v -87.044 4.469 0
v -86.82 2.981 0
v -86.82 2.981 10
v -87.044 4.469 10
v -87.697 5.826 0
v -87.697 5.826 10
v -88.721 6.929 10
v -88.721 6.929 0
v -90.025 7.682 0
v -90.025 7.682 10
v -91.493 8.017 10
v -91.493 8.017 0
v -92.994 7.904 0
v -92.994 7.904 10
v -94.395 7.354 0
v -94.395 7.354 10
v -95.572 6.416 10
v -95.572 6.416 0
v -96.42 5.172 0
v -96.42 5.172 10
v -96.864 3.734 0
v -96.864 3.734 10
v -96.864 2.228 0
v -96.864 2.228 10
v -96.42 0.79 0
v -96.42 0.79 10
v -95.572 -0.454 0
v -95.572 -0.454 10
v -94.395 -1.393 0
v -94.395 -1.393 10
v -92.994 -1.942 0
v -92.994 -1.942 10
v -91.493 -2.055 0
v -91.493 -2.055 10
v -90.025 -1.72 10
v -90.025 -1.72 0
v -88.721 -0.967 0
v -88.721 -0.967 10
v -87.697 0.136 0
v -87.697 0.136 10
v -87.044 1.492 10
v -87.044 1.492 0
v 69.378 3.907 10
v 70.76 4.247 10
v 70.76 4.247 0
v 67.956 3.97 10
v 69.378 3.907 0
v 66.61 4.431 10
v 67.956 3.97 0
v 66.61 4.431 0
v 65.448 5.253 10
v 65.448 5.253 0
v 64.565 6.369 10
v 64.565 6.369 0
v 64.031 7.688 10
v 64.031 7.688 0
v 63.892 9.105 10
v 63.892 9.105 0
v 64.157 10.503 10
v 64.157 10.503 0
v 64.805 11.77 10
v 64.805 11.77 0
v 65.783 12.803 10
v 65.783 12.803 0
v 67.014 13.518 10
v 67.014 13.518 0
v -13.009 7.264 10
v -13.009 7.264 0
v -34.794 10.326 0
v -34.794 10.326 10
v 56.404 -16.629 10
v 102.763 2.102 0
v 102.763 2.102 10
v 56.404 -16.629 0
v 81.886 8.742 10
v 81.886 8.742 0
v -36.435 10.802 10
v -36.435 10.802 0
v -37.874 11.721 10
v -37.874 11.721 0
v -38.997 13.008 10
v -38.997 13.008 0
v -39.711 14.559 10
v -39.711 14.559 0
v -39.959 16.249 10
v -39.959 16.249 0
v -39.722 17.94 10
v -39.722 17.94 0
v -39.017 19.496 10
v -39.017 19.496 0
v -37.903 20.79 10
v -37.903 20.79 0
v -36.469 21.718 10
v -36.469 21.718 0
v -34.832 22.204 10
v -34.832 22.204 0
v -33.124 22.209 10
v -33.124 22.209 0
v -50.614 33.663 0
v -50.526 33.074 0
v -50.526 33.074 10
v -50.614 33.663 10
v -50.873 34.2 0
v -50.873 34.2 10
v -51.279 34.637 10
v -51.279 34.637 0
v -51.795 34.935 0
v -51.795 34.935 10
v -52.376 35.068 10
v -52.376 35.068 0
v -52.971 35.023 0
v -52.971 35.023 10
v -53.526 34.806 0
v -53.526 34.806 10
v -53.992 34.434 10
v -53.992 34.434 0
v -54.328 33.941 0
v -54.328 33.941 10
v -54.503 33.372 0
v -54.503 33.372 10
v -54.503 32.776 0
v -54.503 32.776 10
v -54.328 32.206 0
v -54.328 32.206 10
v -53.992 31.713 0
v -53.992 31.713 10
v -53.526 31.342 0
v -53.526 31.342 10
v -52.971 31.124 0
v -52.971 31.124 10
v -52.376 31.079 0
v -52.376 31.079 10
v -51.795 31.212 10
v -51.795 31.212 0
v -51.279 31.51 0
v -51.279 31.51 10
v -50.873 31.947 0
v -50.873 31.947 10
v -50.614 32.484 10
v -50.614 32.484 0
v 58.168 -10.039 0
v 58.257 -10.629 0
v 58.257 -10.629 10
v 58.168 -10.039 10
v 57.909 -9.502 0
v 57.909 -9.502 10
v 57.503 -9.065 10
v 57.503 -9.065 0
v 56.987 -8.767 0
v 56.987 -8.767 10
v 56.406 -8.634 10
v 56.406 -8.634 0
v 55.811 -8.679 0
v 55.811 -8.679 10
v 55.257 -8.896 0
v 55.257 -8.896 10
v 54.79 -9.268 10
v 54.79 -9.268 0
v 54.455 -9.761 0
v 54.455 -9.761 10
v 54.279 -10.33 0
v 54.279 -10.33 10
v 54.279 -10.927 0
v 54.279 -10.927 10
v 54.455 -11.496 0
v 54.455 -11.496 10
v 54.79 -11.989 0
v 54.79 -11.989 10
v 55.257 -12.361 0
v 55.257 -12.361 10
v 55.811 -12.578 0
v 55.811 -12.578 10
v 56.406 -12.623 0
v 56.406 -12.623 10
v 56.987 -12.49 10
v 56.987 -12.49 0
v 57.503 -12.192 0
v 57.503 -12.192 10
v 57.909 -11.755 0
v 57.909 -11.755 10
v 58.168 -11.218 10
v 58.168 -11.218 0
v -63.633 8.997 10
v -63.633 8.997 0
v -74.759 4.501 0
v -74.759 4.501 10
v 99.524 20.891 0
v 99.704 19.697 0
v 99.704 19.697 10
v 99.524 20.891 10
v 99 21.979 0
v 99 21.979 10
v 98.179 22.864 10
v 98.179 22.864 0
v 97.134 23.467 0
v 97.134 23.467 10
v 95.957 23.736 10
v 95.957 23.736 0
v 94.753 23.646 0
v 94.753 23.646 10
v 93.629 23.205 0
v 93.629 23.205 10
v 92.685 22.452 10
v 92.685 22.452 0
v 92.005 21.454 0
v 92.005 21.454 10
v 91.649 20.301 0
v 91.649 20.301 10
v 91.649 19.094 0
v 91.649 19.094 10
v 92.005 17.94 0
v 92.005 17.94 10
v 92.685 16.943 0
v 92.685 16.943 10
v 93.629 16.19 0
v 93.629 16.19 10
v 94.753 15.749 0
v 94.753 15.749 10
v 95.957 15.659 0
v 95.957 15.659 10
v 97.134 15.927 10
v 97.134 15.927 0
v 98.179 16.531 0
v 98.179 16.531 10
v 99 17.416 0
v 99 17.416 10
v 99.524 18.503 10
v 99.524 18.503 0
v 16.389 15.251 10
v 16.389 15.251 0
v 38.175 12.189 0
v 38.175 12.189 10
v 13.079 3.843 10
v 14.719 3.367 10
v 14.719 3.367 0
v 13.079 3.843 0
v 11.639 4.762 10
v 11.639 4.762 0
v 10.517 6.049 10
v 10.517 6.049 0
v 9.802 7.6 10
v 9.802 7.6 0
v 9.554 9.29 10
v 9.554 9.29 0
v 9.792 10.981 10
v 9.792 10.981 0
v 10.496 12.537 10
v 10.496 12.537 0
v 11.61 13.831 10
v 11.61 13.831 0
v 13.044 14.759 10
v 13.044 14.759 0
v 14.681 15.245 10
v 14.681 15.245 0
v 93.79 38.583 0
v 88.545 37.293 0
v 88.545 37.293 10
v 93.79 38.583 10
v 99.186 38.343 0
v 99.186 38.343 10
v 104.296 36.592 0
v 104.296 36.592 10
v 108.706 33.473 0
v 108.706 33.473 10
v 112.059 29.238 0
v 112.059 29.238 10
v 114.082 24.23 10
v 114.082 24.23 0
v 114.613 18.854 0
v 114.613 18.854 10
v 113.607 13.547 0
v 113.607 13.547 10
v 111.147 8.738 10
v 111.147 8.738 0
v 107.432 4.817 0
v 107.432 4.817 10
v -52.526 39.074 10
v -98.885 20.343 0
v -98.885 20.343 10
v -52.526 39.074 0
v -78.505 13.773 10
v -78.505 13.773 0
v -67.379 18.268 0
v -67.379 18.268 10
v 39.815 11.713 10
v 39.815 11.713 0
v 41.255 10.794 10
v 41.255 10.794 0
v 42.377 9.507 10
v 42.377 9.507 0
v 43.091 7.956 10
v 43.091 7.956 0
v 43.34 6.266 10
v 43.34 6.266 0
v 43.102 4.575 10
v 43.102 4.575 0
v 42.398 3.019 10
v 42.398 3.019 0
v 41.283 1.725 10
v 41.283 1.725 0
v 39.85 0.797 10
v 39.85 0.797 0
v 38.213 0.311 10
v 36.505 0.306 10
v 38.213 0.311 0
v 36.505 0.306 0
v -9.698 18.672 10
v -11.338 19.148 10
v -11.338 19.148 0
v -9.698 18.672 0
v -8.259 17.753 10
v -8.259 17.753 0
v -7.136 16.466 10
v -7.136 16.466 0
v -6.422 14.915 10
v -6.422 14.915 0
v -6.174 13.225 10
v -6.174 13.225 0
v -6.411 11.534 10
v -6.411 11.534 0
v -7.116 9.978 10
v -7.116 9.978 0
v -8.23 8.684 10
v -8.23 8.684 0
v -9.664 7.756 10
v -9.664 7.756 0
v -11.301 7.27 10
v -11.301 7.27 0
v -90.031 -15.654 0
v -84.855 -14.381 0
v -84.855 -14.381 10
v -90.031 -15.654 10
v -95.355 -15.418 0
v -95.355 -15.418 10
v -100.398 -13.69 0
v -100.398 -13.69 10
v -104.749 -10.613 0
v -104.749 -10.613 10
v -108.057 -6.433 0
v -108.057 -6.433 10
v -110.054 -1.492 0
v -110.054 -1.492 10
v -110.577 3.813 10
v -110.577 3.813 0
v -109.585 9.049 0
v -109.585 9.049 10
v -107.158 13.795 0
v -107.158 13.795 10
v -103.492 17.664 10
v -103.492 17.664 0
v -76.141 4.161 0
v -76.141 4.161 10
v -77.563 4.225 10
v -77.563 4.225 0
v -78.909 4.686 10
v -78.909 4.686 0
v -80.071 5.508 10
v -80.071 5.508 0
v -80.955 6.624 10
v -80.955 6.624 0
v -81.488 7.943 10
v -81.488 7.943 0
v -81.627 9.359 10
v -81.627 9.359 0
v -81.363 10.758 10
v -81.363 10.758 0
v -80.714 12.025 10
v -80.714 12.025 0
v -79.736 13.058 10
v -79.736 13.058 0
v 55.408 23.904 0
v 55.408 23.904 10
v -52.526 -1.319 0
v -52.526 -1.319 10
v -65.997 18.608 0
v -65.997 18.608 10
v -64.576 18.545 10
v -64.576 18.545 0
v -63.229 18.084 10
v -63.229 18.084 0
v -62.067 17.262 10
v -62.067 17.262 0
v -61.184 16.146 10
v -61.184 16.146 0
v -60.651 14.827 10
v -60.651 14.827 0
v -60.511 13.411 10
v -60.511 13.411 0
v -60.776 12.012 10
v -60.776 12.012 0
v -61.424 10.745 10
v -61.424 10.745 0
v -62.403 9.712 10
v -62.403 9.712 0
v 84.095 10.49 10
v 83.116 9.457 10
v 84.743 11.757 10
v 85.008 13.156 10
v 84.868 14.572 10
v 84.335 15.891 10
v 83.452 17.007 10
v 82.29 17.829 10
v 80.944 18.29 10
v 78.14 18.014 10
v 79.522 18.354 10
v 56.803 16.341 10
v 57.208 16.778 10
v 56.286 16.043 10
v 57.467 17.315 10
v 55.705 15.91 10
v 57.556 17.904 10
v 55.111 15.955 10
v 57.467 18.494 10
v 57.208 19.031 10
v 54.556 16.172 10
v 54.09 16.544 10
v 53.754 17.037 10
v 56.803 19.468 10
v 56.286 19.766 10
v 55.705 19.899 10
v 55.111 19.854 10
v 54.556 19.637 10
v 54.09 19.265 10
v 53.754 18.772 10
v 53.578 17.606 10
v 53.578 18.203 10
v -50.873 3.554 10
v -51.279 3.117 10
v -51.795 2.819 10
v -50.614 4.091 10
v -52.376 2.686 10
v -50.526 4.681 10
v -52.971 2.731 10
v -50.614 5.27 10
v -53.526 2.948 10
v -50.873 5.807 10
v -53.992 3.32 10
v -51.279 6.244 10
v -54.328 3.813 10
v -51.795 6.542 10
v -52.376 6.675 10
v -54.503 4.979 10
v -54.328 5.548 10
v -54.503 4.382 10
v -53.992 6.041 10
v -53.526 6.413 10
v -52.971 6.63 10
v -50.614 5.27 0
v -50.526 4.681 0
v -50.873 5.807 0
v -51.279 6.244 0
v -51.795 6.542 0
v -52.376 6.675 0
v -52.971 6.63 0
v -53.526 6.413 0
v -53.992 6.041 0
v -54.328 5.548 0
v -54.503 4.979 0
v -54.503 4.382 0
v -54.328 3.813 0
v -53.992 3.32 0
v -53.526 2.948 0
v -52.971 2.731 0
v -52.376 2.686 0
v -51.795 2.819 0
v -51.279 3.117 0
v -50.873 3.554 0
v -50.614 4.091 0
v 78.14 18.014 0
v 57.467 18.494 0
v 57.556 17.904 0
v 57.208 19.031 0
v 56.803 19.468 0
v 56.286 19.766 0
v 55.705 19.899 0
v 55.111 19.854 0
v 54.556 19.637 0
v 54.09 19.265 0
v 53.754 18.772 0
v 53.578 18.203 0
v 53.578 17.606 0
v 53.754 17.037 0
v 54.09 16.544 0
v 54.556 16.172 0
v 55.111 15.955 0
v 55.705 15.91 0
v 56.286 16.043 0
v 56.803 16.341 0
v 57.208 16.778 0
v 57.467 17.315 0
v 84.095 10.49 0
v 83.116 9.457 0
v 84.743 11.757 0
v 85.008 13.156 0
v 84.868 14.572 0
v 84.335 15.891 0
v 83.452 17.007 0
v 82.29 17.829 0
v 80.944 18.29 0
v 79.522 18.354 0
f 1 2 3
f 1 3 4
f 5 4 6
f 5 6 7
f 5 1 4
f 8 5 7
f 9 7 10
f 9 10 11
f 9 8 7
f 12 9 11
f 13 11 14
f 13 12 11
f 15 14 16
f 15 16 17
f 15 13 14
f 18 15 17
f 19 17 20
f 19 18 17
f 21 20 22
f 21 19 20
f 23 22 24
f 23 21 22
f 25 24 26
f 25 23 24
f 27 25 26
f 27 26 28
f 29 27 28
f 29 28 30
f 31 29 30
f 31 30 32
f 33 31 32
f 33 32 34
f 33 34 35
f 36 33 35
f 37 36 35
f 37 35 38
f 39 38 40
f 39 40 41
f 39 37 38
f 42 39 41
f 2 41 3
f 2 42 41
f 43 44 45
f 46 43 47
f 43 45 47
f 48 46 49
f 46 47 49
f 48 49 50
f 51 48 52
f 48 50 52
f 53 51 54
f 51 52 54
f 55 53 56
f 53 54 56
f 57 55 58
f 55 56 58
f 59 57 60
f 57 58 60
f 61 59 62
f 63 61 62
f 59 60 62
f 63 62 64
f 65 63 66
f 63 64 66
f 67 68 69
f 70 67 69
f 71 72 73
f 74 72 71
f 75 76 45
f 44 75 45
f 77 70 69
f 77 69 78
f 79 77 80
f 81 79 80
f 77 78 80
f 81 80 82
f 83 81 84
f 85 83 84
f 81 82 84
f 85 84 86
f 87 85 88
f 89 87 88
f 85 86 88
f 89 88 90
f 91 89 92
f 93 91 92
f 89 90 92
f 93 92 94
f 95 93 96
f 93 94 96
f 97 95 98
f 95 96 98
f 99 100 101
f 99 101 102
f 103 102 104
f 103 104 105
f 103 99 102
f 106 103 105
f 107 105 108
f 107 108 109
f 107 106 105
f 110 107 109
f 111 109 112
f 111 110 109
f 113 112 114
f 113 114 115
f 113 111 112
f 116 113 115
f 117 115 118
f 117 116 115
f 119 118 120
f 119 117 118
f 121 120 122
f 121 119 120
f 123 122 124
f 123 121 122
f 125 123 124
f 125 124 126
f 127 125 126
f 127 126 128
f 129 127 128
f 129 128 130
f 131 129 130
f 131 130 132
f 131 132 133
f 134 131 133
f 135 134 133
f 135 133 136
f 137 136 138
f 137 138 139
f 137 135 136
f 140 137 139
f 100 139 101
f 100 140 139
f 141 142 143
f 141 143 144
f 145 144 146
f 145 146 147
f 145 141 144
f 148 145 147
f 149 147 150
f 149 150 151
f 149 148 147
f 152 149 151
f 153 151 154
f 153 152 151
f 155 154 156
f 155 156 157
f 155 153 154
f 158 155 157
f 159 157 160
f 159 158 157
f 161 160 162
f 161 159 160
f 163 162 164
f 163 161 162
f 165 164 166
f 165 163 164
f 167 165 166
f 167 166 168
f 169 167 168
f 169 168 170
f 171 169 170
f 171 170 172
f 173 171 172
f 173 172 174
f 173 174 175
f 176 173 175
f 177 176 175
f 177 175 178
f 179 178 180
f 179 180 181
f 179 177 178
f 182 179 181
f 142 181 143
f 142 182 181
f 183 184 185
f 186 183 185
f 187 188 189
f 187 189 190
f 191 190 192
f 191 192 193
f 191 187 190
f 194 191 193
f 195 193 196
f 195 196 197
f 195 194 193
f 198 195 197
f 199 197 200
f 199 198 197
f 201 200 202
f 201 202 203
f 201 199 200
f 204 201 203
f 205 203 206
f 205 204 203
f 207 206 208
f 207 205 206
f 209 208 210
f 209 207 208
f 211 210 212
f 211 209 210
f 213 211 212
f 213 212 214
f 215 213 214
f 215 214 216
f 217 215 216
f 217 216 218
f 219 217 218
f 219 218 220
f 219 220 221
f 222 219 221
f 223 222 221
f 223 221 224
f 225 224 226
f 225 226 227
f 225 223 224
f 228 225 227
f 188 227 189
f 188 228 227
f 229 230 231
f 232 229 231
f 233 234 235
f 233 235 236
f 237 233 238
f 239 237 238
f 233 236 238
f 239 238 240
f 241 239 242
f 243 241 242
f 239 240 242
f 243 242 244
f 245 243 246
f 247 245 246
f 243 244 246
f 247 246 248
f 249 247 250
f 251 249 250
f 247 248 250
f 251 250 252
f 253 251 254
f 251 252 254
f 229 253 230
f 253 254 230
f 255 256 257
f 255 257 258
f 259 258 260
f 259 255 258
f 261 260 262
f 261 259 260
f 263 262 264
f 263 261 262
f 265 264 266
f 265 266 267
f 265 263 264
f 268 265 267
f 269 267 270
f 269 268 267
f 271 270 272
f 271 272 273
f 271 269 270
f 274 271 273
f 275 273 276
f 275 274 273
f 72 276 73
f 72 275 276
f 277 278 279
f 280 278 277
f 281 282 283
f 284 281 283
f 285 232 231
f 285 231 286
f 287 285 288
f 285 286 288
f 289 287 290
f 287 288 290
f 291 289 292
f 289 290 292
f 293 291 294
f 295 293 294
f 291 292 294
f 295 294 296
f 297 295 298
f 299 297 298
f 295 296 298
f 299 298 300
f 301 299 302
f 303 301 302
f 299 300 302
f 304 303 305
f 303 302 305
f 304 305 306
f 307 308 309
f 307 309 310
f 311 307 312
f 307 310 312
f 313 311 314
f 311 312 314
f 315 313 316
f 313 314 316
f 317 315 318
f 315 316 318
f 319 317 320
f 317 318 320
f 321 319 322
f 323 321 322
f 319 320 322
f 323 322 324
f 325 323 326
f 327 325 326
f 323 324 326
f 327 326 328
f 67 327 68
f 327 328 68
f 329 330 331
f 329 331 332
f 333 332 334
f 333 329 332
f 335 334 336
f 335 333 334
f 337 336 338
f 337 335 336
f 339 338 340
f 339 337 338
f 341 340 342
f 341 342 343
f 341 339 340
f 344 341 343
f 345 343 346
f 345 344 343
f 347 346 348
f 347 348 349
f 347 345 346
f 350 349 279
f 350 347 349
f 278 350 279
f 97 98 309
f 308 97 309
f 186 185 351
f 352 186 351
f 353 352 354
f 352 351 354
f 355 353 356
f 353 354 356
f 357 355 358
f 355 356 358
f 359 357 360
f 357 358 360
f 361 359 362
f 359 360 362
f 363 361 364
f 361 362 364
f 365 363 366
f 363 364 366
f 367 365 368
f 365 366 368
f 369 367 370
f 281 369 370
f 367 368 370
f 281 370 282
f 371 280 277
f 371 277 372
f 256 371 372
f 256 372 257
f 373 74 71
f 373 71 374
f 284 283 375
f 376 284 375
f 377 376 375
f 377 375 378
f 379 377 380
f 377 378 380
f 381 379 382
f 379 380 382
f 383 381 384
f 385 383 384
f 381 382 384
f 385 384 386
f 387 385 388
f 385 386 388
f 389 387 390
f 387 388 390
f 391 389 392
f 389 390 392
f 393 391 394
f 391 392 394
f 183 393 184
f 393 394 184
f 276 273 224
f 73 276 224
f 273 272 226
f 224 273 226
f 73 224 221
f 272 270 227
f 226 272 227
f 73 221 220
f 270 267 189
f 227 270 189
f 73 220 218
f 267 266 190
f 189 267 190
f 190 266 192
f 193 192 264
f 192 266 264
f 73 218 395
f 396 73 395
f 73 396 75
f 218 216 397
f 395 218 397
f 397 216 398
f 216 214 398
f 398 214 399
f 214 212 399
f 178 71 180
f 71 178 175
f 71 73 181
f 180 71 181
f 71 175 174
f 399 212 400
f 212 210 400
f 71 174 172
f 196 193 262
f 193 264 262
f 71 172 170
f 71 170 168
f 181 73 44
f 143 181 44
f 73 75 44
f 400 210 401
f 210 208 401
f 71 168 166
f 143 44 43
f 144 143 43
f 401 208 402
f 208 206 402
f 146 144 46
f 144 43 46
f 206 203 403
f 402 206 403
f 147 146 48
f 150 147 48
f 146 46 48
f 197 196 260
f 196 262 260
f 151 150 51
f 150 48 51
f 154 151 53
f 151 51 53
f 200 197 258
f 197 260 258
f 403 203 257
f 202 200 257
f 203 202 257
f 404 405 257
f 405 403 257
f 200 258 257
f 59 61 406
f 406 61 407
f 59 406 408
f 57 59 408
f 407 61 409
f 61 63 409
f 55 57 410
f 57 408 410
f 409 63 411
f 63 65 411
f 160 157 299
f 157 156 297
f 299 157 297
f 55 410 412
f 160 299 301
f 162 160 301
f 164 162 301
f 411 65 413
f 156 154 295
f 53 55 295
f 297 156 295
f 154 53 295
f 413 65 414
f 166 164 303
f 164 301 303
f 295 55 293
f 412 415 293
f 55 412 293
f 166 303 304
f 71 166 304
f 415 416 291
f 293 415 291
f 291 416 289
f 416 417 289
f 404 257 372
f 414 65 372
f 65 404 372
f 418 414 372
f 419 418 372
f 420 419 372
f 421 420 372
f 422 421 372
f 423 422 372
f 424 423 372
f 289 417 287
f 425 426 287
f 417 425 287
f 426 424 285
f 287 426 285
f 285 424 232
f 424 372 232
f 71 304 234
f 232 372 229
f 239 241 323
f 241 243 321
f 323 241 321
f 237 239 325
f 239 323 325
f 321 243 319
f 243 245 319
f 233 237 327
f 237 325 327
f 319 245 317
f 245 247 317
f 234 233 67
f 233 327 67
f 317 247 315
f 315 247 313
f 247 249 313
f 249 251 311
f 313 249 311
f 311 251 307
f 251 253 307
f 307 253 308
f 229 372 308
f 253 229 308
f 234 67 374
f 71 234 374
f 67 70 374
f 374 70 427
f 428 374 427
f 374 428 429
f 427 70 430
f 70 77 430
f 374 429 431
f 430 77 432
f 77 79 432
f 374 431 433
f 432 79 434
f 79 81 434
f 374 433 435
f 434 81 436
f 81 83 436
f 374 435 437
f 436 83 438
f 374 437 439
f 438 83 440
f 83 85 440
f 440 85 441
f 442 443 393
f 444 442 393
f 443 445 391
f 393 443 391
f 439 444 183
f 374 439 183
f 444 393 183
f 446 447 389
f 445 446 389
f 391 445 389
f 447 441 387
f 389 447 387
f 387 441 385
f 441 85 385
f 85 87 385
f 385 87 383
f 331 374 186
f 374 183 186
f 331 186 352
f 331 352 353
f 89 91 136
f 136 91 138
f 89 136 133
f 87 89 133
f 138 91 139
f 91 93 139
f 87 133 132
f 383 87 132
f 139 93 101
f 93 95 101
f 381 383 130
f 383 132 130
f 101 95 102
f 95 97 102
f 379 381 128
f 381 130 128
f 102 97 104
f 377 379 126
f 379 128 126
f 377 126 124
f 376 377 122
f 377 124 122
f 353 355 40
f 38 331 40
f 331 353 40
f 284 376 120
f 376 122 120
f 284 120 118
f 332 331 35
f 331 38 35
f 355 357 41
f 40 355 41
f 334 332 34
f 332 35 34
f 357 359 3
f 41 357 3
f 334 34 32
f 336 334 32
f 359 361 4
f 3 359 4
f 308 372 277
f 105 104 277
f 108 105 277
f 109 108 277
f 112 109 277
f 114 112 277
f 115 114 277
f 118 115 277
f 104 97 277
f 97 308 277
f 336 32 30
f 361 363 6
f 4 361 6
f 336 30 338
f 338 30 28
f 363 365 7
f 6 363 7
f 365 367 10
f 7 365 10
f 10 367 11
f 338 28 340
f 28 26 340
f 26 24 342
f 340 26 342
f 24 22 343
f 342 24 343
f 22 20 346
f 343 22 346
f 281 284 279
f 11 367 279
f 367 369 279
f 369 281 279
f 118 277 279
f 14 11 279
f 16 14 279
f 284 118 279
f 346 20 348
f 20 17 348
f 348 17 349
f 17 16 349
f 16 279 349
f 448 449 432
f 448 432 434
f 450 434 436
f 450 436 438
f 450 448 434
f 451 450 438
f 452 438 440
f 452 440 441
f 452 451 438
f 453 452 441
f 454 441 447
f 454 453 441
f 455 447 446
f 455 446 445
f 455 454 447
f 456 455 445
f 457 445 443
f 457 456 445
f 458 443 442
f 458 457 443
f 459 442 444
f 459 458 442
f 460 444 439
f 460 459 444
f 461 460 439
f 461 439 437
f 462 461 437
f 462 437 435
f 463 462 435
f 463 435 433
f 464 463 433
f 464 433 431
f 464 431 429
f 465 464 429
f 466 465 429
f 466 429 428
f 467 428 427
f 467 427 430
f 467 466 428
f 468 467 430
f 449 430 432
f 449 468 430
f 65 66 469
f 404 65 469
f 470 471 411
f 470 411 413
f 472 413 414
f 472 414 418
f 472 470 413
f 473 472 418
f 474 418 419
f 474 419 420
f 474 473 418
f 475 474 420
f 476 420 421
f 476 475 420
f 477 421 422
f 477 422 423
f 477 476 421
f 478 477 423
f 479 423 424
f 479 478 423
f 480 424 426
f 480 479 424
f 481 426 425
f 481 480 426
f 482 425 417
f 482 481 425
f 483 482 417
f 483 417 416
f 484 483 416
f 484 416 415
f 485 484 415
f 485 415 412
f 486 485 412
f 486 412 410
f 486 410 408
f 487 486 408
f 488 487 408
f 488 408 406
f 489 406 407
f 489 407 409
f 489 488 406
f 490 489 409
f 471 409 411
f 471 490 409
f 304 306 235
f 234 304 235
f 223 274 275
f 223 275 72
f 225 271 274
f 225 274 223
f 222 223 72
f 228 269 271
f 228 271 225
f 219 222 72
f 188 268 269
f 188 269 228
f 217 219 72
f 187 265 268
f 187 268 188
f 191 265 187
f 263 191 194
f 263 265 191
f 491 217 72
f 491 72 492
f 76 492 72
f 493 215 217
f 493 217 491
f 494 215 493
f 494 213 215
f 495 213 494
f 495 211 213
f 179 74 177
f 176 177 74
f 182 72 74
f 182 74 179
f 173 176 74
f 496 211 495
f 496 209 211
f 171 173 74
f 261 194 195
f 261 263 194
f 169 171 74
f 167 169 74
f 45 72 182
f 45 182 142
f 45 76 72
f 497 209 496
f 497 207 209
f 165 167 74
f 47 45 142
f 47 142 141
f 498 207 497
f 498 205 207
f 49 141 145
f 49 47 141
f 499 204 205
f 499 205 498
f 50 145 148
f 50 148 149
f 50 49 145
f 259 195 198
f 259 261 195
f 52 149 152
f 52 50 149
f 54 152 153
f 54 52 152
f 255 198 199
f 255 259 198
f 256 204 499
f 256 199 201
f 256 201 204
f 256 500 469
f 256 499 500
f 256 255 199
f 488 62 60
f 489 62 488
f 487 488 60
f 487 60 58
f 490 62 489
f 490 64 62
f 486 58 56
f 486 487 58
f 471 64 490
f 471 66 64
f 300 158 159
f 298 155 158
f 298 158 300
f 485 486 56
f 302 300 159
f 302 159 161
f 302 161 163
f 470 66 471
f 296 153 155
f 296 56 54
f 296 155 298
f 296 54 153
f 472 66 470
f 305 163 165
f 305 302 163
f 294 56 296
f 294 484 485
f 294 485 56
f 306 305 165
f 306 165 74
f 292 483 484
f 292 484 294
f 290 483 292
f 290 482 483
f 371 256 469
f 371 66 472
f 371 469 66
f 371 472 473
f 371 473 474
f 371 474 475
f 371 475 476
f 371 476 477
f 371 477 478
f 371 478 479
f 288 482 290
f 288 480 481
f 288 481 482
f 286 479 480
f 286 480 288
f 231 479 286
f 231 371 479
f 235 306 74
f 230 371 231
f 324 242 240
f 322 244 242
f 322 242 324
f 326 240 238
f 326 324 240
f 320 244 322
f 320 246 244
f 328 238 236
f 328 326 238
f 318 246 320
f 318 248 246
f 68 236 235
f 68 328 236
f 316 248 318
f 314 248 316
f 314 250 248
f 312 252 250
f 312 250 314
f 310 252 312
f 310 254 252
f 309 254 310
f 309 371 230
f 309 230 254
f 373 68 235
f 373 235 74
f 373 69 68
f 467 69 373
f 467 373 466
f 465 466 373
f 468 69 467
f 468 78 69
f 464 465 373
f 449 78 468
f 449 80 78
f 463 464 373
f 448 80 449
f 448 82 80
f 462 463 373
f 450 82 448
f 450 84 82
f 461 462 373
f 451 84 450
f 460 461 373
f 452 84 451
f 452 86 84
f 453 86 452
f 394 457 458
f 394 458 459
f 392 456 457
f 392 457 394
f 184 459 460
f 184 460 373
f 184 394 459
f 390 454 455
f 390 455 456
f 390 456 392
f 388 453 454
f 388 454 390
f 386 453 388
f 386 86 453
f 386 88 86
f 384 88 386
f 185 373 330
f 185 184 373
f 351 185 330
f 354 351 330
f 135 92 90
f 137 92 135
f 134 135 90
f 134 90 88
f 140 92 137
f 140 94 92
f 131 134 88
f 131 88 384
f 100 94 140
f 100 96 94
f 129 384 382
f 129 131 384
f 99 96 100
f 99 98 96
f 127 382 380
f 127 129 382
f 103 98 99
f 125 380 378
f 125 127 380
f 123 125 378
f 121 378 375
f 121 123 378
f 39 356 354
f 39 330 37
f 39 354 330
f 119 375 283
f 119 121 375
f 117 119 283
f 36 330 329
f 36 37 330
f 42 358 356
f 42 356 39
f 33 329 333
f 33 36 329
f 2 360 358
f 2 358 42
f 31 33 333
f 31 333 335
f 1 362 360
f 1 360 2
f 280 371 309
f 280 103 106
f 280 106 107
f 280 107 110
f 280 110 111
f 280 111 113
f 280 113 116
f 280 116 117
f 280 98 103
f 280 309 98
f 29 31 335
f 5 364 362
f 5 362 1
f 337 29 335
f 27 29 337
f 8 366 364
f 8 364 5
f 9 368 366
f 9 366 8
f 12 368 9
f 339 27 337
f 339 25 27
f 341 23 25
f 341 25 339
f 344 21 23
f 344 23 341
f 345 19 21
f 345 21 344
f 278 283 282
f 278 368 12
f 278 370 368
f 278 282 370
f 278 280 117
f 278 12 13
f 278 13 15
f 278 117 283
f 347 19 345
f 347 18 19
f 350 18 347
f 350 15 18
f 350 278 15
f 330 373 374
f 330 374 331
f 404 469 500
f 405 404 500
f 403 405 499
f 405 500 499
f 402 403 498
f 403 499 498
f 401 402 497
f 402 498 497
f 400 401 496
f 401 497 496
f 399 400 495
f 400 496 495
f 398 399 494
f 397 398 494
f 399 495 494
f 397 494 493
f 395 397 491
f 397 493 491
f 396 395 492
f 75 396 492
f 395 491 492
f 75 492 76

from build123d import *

# Parameters (mm, degrees)
SKETCH2_R           = 5.05
SKETCH2_R_2         = 4.05
SKETCH2_R_3         = 2
BOSS_EXTRUDE1_DEPTH = 10


with BuildPart() as part:
    # Sketch2 → Boss-Extrude1 (new body)
    with BuildSketch(Plane.XY):
        with BuildLine():
            Line((-52.525602652, 39.073613719), (55.40832582, 23.904489319))
            Line((55.40832582, 23.904489319), (88.545070057, 37.292603029))
            ThreePointArc((88.545070057, 37.292603029), (113.24947567, 26.806204997), (102.763077638, 2.101799383))
            Line((102.763077638, 2.101799383), (56.40388491, -16.628530288))
            Line((56.40388491, -16.628530288), (-52.525602652, -1.319489182))
            Line((-52.525602652, -1.319489182), (-84.855091861, -14.38145069))
            ThreePointArc((-84.855091861, -14.38145069), (-109.23231099, -4.033935081), (-98.88479538, 20.343284048))
            Line((-98.88479538, 20.343284048), (-52.525602652, 39.073613719))
        make_face()
        with Locations((-91.869943621, 2.980916679)):
            Circle(SKETCH2_R, mode=Mode.SUBTRACT)
        with Locations((95.654073847, 19.697201206)):
            Circle(SKETCH2_R_2, mode=Mode.SUBTRACT)
        with Locations((-52.525602652, 33.073613719)):
            Circle(SKETCH2_R_3, mode=Mode.SUBTRACT)
        with Locations((55.555695905, 17.904489319)):
            Circle(SKETCH2_R_3, mode=Mode.SUBTRACT)
        with Locations((-52.525602652, 4.680510818)):
            Circle(SKETCH2_R_3, mode=Mode.SUBTRACT)
        with Locations((56.256514825, -10.628530288)):
            Circle(SKETCH2_R_3, mode=Mode.SUBTRACT)
        with BuildLine():
            Line((-33.124360513, 22.209360939), (-11.338463, 19.147552718))
            ThreePointArc((-11.338463, 19.147552718), (-6.231893194, 12.3709057), (-13.008540212, 7.264335893))
            Line((-13.008540212, 7.264335893), (-34.794437724, 10.326144114))
            ThreePointArc((-34.794437724, 10.326144114), (-39.901007531, 17.102791132), (-33.124360513, 22.209360939))
        make_face(mode=Mode.SUBTRACT)
        with BuildLine():
            Line((-78.505415838, 13.773210112), (-67.379209583, 18.268489233))
            ThreePointArc((-67.379209583, 18.268489233), (-60.870257343, 15.505602928), (-63.633143649, 8.996650688))
            Line((-63.633143649, 8.996650688), (-74.759349904, 4.501371567))
            ThreePointArc((-74.759349904, 4.501371567), (-81.268302144, 7.264257873), (-78.505415838, 13.773210112))
        make_face(mode=Mode.SUBTRACT)
        with BuildLine():
            Line((67.013646361, 13.518391096), (78.139852616, 18.013670217))
            ThreePointArc((78.139852616, 18.013670217), (84.648804856, 15.250783911), (81.88591855, 8.741831672))
            Line((81.88591855, 8.741831672), (70.759712296, 4.246552551))
            ThreePointArc((70.759712296, 4.246552551), (64.250760056, 7.009438856), (67.013646361, 13.518391096))
        make_face(mode=Mode.SUBTRACT)
        with BuildLine():
            Line((16.389042924, 15.250705891), (38.174940437, 12.18889767))
            ThreePointArc((38.174940437, 12.18889767), (43.281510244, 5.412250652), (36.504863225, 0.305680845))
            Line((36.504863225, 0.305680845), (14.718965713, 3.367489066))
            ThreePointArc((14.718965713, 3.367489066), (9.612395906, 10.144136084), (16.389042924, 15.250705891))
        make_face(mode=Mode.SUBTRACT)
    extrude(amount=BOSS_EXTRUDE1_DEPTH)


solid = part.part
